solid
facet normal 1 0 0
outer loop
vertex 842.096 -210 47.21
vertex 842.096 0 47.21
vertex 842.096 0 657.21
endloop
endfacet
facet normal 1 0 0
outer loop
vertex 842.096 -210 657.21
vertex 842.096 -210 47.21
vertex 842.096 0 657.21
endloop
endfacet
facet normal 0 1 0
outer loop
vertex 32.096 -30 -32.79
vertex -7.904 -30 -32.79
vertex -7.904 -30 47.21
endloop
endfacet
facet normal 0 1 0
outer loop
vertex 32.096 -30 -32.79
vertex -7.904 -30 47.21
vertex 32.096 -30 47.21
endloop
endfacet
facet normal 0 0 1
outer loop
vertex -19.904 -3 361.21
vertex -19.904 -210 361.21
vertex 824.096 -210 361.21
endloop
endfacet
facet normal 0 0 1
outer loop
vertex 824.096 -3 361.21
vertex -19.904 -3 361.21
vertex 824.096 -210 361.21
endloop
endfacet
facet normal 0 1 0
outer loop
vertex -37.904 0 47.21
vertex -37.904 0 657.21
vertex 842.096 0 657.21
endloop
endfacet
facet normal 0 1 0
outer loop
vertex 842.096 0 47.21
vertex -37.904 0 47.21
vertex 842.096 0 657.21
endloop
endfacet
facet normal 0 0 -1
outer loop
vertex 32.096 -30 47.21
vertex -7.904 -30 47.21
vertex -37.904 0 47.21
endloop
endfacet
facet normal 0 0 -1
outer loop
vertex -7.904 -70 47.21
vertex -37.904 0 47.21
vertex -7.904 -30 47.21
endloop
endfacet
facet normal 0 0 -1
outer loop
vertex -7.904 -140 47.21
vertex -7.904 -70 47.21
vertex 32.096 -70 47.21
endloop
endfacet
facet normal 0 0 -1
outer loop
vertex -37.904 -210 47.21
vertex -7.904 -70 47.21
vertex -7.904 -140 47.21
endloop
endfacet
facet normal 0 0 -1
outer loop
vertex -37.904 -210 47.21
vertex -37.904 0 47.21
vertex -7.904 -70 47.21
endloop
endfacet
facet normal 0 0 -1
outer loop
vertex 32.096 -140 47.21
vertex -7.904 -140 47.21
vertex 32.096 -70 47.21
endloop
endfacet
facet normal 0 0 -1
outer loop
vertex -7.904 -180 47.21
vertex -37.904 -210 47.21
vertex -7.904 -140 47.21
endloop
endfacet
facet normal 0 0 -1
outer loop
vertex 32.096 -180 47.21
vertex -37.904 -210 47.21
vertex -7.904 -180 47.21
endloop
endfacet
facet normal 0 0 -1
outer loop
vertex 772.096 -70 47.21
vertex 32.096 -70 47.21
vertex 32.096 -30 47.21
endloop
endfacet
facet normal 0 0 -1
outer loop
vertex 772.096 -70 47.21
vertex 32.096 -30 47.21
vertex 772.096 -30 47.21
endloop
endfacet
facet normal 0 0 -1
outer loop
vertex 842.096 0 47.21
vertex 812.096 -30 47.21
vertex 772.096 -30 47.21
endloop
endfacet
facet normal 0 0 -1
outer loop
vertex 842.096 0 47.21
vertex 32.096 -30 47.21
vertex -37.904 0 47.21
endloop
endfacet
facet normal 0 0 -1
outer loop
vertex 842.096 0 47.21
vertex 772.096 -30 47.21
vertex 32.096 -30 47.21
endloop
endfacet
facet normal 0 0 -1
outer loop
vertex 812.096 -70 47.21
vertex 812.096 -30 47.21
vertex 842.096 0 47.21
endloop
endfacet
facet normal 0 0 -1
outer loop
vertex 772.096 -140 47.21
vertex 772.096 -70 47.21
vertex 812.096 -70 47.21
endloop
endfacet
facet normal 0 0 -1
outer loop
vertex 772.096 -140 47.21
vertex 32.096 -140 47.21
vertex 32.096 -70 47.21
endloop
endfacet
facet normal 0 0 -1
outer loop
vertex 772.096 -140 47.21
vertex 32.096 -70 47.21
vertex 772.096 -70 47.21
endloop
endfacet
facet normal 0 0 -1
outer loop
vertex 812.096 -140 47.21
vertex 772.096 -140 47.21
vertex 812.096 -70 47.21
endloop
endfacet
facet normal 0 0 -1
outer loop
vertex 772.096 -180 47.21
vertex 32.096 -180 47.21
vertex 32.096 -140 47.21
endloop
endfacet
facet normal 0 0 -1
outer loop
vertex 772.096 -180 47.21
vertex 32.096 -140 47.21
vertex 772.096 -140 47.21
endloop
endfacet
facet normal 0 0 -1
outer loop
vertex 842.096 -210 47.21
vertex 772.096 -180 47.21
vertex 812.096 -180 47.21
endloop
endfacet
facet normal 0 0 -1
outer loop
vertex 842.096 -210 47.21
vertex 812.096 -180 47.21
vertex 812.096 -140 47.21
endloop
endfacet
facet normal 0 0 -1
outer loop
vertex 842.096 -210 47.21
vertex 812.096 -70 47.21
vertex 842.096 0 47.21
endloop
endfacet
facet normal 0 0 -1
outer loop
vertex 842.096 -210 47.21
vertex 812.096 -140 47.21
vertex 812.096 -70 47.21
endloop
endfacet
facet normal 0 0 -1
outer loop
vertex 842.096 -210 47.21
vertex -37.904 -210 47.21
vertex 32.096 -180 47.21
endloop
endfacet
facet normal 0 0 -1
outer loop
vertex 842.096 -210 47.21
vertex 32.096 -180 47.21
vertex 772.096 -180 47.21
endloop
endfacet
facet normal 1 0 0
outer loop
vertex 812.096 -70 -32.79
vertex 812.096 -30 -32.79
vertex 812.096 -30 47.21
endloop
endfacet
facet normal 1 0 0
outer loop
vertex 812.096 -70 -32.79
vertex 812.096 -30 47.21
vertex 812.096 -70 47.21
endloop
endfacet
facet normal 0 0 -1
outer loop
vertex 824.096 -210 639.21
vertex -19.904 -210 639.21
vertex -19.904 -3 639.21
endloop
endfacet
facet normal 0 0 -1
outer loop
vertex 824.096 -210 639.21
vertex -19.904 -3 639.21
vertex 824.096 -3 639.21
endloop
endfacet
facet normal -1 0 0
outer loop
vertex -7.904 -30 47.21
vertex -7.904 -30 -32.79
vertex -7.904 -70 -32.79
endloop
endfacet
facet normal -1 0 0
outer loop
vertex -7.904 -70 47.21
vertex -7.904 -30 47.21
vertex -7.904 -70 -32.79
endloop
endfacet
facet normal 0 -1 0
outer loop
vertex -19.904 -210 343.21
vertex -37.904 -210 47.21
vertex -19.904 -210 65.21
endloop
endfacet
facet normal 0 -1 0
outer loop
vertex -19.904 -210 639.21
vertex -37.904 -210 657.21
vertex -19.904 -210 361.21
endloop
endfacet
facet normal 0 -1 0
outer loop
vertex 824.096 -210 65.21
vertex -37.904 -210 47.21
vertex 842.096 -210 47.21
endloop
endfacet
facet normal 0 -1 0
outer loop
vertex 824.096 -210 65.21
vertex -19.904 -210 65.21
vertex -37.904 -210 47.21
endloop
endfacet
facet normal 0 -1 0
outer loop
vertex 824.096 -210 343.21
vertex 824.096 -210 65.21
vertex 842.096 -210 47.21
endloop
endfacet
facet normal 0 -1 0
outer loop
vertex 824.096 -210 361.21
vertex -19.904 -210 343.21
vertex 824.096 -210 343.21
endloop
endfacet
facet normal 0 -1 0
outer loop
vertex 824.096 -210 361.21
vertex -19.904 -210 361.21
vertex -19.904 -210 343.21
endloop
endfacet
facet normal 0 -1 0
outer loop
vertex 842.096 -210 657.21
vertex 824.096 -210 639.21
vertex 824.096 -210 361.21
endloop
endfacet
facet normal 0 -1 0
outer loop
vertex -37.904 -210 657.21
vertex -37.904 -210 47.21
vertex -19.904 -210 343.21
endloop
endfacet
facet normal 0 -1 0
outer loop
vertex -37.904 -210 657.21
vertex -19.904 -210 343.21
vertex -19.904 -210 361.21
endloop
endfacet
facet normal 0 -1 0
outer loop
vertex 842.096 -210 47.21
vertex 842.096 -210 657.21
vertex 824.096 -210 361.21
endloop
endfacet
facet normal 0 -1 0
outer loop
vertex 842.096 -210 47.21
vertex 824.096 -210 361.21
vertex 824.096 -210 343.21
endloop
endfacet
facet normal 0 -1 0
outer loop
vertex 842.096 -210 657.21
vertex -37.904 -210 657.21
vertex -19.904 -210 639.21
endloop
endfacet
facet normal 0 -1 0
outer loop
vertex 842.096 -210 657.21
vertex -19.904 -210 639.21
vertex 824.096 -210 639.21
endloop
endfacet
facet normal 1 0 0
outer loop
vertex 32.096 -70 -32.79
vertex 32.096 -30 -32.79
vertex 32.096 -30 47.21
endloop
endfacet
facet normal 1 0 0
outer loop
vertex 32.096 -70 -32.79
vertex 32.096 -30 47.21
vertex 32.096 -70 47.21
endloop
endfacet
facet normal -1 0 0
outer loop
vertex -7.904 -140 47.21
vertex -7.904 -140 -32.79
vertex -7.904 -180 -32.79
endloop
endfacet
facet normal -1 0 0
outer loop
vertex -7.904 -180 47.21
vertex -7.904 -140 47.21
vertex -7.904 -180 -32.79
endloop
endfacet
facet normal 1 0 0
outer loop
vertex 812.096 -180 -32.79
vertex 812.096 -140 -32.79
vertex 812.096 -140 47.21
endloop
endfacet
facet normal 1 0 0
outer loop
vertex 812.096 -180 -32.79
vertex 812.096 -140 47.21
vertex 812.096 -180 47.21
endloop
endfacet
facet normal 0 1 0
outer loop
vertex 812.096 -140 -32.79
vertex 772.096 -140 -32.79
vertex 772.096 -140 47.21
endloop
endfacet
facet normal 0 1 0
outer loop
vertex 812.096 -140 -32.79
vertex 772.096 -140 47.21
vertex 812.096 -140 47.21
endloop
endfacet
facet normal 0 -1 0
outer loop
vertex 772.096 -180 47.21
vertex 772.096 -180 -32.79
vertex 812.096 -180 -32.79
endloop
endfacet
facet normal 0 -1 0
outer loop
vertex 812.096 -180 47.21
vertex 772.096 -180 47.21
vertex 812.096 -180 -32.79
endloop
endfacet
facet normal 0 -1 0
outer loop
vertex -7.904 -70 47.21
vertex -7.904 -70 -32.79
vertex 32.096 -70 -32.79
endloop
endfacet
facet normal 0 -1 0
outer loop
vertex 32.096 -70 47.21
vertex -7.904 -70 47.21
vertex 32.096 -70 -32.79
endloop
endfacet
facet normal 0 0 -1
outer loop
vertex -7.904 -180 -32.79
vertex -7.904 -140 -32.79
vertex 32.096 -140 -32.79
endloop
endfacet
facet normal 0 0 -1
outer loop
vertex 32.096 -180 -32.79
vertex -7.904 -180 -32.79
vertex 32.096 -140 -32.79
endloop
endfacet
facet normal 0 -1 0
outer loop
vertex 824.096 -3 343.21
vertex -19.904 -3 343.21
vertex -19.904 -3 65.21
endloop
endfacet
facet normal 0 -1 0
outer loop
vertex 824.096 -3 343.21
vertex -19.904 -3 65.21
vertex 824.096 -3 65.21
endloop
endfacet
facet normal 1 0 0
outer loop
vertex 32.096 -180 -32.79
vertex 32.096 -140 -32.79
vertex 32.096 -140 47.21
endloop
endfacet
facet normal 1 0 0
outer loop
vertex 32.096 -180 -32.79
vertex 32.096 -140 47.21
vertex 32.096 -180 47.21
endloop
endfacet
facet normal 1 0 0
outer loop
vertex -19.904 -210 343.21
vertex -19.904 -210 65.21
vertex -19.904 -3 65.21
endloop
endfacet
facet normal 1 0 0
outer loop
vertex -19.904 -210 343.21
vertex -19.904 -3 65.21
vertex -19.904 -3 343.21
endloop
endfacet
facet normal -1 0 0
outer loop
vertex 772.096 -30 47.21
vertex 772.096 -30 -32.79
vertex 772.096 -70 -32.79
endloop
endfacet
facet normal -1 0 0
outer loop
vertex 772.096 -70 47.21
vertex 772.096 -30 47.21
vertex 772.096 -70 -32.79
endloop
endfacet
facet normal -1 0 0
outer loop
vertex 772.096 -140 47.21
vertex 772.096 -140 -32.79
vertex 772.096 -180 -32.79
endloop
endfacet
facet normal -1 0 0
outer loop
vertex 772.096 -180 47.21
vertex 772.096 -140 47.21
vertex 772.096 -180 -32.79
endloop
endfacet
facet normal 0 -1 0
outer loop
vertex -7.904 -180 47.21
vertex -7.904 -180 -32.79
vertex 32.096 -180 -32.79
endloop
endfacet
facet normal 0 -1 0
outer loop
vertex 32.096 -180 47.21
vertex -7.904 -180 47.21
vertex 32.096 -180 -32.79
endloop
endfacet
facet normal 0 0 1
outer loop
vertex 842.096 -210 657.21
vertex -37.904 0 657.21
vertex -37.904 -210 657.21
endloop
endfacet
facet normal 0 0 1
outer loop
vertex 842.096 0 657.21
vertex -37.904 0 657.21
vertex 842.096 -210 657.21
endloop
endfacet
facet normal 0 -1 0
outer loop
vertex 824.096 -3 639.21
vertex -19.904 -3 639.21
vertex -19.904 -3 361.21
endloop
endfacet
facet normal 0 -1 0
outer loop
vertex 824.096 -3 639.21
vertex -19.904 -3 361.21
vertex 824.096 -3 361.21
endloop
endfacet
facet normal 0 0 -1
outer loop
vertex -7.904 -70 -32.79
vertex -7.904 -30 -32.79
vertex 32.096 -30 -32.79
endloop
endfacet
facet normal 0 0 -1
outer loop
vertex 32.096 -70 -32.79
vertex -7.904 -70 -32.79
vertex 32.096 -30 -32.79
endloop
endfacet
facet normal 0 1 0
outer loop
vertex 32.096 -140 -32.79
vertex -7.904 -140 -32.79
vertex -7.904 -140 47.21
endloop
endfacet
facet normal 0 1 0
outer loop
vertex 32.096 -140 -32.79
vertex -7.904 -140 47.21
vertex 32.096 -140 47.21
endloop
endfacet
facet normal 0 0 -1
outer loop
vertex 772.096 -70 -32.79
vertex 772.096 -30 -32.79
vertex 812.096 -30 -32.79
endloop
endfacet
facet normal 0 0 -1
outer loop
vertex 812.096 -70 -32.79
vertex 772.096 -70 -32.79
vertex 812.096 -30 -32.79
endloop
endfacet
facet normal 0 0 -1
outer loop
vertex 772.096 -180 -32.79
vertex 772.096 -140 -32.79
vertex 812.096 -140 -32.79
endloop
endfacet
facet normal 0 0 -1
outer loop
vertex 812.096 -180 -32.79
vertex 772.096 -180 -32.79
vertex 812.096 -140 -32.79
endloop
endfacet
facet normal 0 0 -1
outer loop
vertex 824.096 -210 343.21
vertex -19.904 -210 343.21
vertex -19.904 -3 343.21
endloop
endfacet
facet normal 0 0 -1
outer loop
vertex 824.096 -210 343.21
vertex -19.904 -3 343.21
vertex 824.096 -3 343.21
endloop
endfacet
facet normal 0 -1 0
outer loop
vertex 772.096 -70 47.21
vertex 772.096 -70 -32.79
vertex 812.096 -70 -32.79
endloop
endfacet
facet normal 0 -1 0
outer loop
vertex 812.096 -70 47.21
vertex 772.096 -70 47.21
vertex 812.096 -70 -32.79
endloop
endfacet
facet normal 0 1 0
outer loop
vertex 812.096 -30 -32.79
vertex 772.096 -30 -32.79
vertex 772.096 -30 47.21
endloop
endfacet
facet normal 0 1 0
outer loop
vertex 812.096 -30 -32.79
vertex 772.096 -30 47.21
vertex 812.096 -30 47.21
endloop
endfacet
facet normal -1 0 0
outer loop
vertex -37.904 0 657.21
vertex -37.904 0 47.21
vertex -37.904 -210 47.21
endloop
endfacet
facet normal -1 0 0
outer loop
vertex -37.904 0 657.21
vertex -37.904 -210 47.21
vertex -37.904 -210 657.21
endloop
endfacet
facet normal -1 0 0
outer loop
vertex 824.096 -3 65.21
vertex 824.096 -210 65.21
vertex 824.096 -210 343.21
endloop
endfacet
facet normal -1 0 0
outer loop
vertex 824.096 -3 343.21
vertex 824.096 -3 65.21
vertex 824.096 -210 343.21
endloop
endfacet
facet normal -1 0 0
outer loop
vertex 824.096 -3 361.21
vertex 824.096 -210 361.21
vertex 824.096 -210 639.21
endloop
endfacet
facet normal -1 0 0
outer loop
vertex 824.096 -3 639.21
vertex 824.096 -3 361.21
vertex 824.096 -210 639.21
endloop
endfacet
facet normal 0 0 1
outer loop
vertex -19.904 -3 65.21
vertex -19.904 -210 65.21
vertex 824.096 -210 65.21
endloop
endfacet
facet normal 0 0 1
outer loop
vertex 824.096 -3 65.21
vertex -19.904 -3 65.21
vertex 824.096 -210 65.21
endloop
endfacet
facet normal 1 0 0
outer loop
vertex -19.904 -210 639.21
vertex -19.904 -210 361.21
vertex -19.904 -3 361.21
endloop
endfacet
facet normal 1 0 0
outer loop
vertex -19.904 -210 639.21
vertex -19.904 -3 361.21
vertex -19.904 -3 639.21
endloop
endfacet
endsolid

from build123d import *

# Parameters (mm, degrees)
F0_W     = 880
F0_H     = 690
F1_DEPTH = 210
F2_W     = 880
F2_H     = 210
F2_W_2   = 40
F2_H_2   = 40
F3_DEPTH = 80
F4_W     = 844
F4_H     = 278
F5_DEPTH = 207


# Not quite as in the source:
# - a feature names something its author has since deleted; it is built from what else it names


with BuildPart() as f1:
    # F0 (on Front) → F1 (new body)
    with BuildSketch(Plane.XZ):
        with Locations((402.0964676142, 312.2104381025)):
            Rectangle(F0_W, F0_H)
    extrude(amount=F1_DEPTH)

    # F2 (on face) → F3 (cut)
    with BuildSketch(Plane(origin=(0, 0, -32.7895618975), x_dir=(1, 0, 0), z_dir=(0, 0, -1))):
        with Locations((402.0964676142, 105)):
            Rectangle(F2_W, F2_H)
        with Locations((12.0964676142, 50)):
            Rectangle(F2_W_2, F2_H_2, mode=Mode.SUBTRACT)
        with Locations((792.0964676142, 50)):
            Rectangle(F2_W_2, F2_H_2, mode=Mode.SUBTRACT)
        with Locations((12.0964676142, 160)):
            Rectangle(F2_W_2, F2_H_2, mode=Mode.SUBTRACT)
        with Locations((792.0964676142, 160)):
            Rectangle(F2_W_2, F2_H_2, mode=Mode.SUBTRACT)
    extrude(amount=-F3_DEPTH, mode=Mode.SUBTRACT)

    # F4 (on face) → F5 (cut, through all)
    with BuildSketch(Plane.XZ.offset(210)):
        with Locations((402.0964676142, 500.2104381025)):
            Rectangle(F4_W, F4_H)
        with Locations((402.0964676142, 204.2104381025)):
            Rectangle(F4_W, F4_H)
    extrude(amount=-F5_DEPTH, mode=Mode.SUBTRACT)


solid = f1.part
